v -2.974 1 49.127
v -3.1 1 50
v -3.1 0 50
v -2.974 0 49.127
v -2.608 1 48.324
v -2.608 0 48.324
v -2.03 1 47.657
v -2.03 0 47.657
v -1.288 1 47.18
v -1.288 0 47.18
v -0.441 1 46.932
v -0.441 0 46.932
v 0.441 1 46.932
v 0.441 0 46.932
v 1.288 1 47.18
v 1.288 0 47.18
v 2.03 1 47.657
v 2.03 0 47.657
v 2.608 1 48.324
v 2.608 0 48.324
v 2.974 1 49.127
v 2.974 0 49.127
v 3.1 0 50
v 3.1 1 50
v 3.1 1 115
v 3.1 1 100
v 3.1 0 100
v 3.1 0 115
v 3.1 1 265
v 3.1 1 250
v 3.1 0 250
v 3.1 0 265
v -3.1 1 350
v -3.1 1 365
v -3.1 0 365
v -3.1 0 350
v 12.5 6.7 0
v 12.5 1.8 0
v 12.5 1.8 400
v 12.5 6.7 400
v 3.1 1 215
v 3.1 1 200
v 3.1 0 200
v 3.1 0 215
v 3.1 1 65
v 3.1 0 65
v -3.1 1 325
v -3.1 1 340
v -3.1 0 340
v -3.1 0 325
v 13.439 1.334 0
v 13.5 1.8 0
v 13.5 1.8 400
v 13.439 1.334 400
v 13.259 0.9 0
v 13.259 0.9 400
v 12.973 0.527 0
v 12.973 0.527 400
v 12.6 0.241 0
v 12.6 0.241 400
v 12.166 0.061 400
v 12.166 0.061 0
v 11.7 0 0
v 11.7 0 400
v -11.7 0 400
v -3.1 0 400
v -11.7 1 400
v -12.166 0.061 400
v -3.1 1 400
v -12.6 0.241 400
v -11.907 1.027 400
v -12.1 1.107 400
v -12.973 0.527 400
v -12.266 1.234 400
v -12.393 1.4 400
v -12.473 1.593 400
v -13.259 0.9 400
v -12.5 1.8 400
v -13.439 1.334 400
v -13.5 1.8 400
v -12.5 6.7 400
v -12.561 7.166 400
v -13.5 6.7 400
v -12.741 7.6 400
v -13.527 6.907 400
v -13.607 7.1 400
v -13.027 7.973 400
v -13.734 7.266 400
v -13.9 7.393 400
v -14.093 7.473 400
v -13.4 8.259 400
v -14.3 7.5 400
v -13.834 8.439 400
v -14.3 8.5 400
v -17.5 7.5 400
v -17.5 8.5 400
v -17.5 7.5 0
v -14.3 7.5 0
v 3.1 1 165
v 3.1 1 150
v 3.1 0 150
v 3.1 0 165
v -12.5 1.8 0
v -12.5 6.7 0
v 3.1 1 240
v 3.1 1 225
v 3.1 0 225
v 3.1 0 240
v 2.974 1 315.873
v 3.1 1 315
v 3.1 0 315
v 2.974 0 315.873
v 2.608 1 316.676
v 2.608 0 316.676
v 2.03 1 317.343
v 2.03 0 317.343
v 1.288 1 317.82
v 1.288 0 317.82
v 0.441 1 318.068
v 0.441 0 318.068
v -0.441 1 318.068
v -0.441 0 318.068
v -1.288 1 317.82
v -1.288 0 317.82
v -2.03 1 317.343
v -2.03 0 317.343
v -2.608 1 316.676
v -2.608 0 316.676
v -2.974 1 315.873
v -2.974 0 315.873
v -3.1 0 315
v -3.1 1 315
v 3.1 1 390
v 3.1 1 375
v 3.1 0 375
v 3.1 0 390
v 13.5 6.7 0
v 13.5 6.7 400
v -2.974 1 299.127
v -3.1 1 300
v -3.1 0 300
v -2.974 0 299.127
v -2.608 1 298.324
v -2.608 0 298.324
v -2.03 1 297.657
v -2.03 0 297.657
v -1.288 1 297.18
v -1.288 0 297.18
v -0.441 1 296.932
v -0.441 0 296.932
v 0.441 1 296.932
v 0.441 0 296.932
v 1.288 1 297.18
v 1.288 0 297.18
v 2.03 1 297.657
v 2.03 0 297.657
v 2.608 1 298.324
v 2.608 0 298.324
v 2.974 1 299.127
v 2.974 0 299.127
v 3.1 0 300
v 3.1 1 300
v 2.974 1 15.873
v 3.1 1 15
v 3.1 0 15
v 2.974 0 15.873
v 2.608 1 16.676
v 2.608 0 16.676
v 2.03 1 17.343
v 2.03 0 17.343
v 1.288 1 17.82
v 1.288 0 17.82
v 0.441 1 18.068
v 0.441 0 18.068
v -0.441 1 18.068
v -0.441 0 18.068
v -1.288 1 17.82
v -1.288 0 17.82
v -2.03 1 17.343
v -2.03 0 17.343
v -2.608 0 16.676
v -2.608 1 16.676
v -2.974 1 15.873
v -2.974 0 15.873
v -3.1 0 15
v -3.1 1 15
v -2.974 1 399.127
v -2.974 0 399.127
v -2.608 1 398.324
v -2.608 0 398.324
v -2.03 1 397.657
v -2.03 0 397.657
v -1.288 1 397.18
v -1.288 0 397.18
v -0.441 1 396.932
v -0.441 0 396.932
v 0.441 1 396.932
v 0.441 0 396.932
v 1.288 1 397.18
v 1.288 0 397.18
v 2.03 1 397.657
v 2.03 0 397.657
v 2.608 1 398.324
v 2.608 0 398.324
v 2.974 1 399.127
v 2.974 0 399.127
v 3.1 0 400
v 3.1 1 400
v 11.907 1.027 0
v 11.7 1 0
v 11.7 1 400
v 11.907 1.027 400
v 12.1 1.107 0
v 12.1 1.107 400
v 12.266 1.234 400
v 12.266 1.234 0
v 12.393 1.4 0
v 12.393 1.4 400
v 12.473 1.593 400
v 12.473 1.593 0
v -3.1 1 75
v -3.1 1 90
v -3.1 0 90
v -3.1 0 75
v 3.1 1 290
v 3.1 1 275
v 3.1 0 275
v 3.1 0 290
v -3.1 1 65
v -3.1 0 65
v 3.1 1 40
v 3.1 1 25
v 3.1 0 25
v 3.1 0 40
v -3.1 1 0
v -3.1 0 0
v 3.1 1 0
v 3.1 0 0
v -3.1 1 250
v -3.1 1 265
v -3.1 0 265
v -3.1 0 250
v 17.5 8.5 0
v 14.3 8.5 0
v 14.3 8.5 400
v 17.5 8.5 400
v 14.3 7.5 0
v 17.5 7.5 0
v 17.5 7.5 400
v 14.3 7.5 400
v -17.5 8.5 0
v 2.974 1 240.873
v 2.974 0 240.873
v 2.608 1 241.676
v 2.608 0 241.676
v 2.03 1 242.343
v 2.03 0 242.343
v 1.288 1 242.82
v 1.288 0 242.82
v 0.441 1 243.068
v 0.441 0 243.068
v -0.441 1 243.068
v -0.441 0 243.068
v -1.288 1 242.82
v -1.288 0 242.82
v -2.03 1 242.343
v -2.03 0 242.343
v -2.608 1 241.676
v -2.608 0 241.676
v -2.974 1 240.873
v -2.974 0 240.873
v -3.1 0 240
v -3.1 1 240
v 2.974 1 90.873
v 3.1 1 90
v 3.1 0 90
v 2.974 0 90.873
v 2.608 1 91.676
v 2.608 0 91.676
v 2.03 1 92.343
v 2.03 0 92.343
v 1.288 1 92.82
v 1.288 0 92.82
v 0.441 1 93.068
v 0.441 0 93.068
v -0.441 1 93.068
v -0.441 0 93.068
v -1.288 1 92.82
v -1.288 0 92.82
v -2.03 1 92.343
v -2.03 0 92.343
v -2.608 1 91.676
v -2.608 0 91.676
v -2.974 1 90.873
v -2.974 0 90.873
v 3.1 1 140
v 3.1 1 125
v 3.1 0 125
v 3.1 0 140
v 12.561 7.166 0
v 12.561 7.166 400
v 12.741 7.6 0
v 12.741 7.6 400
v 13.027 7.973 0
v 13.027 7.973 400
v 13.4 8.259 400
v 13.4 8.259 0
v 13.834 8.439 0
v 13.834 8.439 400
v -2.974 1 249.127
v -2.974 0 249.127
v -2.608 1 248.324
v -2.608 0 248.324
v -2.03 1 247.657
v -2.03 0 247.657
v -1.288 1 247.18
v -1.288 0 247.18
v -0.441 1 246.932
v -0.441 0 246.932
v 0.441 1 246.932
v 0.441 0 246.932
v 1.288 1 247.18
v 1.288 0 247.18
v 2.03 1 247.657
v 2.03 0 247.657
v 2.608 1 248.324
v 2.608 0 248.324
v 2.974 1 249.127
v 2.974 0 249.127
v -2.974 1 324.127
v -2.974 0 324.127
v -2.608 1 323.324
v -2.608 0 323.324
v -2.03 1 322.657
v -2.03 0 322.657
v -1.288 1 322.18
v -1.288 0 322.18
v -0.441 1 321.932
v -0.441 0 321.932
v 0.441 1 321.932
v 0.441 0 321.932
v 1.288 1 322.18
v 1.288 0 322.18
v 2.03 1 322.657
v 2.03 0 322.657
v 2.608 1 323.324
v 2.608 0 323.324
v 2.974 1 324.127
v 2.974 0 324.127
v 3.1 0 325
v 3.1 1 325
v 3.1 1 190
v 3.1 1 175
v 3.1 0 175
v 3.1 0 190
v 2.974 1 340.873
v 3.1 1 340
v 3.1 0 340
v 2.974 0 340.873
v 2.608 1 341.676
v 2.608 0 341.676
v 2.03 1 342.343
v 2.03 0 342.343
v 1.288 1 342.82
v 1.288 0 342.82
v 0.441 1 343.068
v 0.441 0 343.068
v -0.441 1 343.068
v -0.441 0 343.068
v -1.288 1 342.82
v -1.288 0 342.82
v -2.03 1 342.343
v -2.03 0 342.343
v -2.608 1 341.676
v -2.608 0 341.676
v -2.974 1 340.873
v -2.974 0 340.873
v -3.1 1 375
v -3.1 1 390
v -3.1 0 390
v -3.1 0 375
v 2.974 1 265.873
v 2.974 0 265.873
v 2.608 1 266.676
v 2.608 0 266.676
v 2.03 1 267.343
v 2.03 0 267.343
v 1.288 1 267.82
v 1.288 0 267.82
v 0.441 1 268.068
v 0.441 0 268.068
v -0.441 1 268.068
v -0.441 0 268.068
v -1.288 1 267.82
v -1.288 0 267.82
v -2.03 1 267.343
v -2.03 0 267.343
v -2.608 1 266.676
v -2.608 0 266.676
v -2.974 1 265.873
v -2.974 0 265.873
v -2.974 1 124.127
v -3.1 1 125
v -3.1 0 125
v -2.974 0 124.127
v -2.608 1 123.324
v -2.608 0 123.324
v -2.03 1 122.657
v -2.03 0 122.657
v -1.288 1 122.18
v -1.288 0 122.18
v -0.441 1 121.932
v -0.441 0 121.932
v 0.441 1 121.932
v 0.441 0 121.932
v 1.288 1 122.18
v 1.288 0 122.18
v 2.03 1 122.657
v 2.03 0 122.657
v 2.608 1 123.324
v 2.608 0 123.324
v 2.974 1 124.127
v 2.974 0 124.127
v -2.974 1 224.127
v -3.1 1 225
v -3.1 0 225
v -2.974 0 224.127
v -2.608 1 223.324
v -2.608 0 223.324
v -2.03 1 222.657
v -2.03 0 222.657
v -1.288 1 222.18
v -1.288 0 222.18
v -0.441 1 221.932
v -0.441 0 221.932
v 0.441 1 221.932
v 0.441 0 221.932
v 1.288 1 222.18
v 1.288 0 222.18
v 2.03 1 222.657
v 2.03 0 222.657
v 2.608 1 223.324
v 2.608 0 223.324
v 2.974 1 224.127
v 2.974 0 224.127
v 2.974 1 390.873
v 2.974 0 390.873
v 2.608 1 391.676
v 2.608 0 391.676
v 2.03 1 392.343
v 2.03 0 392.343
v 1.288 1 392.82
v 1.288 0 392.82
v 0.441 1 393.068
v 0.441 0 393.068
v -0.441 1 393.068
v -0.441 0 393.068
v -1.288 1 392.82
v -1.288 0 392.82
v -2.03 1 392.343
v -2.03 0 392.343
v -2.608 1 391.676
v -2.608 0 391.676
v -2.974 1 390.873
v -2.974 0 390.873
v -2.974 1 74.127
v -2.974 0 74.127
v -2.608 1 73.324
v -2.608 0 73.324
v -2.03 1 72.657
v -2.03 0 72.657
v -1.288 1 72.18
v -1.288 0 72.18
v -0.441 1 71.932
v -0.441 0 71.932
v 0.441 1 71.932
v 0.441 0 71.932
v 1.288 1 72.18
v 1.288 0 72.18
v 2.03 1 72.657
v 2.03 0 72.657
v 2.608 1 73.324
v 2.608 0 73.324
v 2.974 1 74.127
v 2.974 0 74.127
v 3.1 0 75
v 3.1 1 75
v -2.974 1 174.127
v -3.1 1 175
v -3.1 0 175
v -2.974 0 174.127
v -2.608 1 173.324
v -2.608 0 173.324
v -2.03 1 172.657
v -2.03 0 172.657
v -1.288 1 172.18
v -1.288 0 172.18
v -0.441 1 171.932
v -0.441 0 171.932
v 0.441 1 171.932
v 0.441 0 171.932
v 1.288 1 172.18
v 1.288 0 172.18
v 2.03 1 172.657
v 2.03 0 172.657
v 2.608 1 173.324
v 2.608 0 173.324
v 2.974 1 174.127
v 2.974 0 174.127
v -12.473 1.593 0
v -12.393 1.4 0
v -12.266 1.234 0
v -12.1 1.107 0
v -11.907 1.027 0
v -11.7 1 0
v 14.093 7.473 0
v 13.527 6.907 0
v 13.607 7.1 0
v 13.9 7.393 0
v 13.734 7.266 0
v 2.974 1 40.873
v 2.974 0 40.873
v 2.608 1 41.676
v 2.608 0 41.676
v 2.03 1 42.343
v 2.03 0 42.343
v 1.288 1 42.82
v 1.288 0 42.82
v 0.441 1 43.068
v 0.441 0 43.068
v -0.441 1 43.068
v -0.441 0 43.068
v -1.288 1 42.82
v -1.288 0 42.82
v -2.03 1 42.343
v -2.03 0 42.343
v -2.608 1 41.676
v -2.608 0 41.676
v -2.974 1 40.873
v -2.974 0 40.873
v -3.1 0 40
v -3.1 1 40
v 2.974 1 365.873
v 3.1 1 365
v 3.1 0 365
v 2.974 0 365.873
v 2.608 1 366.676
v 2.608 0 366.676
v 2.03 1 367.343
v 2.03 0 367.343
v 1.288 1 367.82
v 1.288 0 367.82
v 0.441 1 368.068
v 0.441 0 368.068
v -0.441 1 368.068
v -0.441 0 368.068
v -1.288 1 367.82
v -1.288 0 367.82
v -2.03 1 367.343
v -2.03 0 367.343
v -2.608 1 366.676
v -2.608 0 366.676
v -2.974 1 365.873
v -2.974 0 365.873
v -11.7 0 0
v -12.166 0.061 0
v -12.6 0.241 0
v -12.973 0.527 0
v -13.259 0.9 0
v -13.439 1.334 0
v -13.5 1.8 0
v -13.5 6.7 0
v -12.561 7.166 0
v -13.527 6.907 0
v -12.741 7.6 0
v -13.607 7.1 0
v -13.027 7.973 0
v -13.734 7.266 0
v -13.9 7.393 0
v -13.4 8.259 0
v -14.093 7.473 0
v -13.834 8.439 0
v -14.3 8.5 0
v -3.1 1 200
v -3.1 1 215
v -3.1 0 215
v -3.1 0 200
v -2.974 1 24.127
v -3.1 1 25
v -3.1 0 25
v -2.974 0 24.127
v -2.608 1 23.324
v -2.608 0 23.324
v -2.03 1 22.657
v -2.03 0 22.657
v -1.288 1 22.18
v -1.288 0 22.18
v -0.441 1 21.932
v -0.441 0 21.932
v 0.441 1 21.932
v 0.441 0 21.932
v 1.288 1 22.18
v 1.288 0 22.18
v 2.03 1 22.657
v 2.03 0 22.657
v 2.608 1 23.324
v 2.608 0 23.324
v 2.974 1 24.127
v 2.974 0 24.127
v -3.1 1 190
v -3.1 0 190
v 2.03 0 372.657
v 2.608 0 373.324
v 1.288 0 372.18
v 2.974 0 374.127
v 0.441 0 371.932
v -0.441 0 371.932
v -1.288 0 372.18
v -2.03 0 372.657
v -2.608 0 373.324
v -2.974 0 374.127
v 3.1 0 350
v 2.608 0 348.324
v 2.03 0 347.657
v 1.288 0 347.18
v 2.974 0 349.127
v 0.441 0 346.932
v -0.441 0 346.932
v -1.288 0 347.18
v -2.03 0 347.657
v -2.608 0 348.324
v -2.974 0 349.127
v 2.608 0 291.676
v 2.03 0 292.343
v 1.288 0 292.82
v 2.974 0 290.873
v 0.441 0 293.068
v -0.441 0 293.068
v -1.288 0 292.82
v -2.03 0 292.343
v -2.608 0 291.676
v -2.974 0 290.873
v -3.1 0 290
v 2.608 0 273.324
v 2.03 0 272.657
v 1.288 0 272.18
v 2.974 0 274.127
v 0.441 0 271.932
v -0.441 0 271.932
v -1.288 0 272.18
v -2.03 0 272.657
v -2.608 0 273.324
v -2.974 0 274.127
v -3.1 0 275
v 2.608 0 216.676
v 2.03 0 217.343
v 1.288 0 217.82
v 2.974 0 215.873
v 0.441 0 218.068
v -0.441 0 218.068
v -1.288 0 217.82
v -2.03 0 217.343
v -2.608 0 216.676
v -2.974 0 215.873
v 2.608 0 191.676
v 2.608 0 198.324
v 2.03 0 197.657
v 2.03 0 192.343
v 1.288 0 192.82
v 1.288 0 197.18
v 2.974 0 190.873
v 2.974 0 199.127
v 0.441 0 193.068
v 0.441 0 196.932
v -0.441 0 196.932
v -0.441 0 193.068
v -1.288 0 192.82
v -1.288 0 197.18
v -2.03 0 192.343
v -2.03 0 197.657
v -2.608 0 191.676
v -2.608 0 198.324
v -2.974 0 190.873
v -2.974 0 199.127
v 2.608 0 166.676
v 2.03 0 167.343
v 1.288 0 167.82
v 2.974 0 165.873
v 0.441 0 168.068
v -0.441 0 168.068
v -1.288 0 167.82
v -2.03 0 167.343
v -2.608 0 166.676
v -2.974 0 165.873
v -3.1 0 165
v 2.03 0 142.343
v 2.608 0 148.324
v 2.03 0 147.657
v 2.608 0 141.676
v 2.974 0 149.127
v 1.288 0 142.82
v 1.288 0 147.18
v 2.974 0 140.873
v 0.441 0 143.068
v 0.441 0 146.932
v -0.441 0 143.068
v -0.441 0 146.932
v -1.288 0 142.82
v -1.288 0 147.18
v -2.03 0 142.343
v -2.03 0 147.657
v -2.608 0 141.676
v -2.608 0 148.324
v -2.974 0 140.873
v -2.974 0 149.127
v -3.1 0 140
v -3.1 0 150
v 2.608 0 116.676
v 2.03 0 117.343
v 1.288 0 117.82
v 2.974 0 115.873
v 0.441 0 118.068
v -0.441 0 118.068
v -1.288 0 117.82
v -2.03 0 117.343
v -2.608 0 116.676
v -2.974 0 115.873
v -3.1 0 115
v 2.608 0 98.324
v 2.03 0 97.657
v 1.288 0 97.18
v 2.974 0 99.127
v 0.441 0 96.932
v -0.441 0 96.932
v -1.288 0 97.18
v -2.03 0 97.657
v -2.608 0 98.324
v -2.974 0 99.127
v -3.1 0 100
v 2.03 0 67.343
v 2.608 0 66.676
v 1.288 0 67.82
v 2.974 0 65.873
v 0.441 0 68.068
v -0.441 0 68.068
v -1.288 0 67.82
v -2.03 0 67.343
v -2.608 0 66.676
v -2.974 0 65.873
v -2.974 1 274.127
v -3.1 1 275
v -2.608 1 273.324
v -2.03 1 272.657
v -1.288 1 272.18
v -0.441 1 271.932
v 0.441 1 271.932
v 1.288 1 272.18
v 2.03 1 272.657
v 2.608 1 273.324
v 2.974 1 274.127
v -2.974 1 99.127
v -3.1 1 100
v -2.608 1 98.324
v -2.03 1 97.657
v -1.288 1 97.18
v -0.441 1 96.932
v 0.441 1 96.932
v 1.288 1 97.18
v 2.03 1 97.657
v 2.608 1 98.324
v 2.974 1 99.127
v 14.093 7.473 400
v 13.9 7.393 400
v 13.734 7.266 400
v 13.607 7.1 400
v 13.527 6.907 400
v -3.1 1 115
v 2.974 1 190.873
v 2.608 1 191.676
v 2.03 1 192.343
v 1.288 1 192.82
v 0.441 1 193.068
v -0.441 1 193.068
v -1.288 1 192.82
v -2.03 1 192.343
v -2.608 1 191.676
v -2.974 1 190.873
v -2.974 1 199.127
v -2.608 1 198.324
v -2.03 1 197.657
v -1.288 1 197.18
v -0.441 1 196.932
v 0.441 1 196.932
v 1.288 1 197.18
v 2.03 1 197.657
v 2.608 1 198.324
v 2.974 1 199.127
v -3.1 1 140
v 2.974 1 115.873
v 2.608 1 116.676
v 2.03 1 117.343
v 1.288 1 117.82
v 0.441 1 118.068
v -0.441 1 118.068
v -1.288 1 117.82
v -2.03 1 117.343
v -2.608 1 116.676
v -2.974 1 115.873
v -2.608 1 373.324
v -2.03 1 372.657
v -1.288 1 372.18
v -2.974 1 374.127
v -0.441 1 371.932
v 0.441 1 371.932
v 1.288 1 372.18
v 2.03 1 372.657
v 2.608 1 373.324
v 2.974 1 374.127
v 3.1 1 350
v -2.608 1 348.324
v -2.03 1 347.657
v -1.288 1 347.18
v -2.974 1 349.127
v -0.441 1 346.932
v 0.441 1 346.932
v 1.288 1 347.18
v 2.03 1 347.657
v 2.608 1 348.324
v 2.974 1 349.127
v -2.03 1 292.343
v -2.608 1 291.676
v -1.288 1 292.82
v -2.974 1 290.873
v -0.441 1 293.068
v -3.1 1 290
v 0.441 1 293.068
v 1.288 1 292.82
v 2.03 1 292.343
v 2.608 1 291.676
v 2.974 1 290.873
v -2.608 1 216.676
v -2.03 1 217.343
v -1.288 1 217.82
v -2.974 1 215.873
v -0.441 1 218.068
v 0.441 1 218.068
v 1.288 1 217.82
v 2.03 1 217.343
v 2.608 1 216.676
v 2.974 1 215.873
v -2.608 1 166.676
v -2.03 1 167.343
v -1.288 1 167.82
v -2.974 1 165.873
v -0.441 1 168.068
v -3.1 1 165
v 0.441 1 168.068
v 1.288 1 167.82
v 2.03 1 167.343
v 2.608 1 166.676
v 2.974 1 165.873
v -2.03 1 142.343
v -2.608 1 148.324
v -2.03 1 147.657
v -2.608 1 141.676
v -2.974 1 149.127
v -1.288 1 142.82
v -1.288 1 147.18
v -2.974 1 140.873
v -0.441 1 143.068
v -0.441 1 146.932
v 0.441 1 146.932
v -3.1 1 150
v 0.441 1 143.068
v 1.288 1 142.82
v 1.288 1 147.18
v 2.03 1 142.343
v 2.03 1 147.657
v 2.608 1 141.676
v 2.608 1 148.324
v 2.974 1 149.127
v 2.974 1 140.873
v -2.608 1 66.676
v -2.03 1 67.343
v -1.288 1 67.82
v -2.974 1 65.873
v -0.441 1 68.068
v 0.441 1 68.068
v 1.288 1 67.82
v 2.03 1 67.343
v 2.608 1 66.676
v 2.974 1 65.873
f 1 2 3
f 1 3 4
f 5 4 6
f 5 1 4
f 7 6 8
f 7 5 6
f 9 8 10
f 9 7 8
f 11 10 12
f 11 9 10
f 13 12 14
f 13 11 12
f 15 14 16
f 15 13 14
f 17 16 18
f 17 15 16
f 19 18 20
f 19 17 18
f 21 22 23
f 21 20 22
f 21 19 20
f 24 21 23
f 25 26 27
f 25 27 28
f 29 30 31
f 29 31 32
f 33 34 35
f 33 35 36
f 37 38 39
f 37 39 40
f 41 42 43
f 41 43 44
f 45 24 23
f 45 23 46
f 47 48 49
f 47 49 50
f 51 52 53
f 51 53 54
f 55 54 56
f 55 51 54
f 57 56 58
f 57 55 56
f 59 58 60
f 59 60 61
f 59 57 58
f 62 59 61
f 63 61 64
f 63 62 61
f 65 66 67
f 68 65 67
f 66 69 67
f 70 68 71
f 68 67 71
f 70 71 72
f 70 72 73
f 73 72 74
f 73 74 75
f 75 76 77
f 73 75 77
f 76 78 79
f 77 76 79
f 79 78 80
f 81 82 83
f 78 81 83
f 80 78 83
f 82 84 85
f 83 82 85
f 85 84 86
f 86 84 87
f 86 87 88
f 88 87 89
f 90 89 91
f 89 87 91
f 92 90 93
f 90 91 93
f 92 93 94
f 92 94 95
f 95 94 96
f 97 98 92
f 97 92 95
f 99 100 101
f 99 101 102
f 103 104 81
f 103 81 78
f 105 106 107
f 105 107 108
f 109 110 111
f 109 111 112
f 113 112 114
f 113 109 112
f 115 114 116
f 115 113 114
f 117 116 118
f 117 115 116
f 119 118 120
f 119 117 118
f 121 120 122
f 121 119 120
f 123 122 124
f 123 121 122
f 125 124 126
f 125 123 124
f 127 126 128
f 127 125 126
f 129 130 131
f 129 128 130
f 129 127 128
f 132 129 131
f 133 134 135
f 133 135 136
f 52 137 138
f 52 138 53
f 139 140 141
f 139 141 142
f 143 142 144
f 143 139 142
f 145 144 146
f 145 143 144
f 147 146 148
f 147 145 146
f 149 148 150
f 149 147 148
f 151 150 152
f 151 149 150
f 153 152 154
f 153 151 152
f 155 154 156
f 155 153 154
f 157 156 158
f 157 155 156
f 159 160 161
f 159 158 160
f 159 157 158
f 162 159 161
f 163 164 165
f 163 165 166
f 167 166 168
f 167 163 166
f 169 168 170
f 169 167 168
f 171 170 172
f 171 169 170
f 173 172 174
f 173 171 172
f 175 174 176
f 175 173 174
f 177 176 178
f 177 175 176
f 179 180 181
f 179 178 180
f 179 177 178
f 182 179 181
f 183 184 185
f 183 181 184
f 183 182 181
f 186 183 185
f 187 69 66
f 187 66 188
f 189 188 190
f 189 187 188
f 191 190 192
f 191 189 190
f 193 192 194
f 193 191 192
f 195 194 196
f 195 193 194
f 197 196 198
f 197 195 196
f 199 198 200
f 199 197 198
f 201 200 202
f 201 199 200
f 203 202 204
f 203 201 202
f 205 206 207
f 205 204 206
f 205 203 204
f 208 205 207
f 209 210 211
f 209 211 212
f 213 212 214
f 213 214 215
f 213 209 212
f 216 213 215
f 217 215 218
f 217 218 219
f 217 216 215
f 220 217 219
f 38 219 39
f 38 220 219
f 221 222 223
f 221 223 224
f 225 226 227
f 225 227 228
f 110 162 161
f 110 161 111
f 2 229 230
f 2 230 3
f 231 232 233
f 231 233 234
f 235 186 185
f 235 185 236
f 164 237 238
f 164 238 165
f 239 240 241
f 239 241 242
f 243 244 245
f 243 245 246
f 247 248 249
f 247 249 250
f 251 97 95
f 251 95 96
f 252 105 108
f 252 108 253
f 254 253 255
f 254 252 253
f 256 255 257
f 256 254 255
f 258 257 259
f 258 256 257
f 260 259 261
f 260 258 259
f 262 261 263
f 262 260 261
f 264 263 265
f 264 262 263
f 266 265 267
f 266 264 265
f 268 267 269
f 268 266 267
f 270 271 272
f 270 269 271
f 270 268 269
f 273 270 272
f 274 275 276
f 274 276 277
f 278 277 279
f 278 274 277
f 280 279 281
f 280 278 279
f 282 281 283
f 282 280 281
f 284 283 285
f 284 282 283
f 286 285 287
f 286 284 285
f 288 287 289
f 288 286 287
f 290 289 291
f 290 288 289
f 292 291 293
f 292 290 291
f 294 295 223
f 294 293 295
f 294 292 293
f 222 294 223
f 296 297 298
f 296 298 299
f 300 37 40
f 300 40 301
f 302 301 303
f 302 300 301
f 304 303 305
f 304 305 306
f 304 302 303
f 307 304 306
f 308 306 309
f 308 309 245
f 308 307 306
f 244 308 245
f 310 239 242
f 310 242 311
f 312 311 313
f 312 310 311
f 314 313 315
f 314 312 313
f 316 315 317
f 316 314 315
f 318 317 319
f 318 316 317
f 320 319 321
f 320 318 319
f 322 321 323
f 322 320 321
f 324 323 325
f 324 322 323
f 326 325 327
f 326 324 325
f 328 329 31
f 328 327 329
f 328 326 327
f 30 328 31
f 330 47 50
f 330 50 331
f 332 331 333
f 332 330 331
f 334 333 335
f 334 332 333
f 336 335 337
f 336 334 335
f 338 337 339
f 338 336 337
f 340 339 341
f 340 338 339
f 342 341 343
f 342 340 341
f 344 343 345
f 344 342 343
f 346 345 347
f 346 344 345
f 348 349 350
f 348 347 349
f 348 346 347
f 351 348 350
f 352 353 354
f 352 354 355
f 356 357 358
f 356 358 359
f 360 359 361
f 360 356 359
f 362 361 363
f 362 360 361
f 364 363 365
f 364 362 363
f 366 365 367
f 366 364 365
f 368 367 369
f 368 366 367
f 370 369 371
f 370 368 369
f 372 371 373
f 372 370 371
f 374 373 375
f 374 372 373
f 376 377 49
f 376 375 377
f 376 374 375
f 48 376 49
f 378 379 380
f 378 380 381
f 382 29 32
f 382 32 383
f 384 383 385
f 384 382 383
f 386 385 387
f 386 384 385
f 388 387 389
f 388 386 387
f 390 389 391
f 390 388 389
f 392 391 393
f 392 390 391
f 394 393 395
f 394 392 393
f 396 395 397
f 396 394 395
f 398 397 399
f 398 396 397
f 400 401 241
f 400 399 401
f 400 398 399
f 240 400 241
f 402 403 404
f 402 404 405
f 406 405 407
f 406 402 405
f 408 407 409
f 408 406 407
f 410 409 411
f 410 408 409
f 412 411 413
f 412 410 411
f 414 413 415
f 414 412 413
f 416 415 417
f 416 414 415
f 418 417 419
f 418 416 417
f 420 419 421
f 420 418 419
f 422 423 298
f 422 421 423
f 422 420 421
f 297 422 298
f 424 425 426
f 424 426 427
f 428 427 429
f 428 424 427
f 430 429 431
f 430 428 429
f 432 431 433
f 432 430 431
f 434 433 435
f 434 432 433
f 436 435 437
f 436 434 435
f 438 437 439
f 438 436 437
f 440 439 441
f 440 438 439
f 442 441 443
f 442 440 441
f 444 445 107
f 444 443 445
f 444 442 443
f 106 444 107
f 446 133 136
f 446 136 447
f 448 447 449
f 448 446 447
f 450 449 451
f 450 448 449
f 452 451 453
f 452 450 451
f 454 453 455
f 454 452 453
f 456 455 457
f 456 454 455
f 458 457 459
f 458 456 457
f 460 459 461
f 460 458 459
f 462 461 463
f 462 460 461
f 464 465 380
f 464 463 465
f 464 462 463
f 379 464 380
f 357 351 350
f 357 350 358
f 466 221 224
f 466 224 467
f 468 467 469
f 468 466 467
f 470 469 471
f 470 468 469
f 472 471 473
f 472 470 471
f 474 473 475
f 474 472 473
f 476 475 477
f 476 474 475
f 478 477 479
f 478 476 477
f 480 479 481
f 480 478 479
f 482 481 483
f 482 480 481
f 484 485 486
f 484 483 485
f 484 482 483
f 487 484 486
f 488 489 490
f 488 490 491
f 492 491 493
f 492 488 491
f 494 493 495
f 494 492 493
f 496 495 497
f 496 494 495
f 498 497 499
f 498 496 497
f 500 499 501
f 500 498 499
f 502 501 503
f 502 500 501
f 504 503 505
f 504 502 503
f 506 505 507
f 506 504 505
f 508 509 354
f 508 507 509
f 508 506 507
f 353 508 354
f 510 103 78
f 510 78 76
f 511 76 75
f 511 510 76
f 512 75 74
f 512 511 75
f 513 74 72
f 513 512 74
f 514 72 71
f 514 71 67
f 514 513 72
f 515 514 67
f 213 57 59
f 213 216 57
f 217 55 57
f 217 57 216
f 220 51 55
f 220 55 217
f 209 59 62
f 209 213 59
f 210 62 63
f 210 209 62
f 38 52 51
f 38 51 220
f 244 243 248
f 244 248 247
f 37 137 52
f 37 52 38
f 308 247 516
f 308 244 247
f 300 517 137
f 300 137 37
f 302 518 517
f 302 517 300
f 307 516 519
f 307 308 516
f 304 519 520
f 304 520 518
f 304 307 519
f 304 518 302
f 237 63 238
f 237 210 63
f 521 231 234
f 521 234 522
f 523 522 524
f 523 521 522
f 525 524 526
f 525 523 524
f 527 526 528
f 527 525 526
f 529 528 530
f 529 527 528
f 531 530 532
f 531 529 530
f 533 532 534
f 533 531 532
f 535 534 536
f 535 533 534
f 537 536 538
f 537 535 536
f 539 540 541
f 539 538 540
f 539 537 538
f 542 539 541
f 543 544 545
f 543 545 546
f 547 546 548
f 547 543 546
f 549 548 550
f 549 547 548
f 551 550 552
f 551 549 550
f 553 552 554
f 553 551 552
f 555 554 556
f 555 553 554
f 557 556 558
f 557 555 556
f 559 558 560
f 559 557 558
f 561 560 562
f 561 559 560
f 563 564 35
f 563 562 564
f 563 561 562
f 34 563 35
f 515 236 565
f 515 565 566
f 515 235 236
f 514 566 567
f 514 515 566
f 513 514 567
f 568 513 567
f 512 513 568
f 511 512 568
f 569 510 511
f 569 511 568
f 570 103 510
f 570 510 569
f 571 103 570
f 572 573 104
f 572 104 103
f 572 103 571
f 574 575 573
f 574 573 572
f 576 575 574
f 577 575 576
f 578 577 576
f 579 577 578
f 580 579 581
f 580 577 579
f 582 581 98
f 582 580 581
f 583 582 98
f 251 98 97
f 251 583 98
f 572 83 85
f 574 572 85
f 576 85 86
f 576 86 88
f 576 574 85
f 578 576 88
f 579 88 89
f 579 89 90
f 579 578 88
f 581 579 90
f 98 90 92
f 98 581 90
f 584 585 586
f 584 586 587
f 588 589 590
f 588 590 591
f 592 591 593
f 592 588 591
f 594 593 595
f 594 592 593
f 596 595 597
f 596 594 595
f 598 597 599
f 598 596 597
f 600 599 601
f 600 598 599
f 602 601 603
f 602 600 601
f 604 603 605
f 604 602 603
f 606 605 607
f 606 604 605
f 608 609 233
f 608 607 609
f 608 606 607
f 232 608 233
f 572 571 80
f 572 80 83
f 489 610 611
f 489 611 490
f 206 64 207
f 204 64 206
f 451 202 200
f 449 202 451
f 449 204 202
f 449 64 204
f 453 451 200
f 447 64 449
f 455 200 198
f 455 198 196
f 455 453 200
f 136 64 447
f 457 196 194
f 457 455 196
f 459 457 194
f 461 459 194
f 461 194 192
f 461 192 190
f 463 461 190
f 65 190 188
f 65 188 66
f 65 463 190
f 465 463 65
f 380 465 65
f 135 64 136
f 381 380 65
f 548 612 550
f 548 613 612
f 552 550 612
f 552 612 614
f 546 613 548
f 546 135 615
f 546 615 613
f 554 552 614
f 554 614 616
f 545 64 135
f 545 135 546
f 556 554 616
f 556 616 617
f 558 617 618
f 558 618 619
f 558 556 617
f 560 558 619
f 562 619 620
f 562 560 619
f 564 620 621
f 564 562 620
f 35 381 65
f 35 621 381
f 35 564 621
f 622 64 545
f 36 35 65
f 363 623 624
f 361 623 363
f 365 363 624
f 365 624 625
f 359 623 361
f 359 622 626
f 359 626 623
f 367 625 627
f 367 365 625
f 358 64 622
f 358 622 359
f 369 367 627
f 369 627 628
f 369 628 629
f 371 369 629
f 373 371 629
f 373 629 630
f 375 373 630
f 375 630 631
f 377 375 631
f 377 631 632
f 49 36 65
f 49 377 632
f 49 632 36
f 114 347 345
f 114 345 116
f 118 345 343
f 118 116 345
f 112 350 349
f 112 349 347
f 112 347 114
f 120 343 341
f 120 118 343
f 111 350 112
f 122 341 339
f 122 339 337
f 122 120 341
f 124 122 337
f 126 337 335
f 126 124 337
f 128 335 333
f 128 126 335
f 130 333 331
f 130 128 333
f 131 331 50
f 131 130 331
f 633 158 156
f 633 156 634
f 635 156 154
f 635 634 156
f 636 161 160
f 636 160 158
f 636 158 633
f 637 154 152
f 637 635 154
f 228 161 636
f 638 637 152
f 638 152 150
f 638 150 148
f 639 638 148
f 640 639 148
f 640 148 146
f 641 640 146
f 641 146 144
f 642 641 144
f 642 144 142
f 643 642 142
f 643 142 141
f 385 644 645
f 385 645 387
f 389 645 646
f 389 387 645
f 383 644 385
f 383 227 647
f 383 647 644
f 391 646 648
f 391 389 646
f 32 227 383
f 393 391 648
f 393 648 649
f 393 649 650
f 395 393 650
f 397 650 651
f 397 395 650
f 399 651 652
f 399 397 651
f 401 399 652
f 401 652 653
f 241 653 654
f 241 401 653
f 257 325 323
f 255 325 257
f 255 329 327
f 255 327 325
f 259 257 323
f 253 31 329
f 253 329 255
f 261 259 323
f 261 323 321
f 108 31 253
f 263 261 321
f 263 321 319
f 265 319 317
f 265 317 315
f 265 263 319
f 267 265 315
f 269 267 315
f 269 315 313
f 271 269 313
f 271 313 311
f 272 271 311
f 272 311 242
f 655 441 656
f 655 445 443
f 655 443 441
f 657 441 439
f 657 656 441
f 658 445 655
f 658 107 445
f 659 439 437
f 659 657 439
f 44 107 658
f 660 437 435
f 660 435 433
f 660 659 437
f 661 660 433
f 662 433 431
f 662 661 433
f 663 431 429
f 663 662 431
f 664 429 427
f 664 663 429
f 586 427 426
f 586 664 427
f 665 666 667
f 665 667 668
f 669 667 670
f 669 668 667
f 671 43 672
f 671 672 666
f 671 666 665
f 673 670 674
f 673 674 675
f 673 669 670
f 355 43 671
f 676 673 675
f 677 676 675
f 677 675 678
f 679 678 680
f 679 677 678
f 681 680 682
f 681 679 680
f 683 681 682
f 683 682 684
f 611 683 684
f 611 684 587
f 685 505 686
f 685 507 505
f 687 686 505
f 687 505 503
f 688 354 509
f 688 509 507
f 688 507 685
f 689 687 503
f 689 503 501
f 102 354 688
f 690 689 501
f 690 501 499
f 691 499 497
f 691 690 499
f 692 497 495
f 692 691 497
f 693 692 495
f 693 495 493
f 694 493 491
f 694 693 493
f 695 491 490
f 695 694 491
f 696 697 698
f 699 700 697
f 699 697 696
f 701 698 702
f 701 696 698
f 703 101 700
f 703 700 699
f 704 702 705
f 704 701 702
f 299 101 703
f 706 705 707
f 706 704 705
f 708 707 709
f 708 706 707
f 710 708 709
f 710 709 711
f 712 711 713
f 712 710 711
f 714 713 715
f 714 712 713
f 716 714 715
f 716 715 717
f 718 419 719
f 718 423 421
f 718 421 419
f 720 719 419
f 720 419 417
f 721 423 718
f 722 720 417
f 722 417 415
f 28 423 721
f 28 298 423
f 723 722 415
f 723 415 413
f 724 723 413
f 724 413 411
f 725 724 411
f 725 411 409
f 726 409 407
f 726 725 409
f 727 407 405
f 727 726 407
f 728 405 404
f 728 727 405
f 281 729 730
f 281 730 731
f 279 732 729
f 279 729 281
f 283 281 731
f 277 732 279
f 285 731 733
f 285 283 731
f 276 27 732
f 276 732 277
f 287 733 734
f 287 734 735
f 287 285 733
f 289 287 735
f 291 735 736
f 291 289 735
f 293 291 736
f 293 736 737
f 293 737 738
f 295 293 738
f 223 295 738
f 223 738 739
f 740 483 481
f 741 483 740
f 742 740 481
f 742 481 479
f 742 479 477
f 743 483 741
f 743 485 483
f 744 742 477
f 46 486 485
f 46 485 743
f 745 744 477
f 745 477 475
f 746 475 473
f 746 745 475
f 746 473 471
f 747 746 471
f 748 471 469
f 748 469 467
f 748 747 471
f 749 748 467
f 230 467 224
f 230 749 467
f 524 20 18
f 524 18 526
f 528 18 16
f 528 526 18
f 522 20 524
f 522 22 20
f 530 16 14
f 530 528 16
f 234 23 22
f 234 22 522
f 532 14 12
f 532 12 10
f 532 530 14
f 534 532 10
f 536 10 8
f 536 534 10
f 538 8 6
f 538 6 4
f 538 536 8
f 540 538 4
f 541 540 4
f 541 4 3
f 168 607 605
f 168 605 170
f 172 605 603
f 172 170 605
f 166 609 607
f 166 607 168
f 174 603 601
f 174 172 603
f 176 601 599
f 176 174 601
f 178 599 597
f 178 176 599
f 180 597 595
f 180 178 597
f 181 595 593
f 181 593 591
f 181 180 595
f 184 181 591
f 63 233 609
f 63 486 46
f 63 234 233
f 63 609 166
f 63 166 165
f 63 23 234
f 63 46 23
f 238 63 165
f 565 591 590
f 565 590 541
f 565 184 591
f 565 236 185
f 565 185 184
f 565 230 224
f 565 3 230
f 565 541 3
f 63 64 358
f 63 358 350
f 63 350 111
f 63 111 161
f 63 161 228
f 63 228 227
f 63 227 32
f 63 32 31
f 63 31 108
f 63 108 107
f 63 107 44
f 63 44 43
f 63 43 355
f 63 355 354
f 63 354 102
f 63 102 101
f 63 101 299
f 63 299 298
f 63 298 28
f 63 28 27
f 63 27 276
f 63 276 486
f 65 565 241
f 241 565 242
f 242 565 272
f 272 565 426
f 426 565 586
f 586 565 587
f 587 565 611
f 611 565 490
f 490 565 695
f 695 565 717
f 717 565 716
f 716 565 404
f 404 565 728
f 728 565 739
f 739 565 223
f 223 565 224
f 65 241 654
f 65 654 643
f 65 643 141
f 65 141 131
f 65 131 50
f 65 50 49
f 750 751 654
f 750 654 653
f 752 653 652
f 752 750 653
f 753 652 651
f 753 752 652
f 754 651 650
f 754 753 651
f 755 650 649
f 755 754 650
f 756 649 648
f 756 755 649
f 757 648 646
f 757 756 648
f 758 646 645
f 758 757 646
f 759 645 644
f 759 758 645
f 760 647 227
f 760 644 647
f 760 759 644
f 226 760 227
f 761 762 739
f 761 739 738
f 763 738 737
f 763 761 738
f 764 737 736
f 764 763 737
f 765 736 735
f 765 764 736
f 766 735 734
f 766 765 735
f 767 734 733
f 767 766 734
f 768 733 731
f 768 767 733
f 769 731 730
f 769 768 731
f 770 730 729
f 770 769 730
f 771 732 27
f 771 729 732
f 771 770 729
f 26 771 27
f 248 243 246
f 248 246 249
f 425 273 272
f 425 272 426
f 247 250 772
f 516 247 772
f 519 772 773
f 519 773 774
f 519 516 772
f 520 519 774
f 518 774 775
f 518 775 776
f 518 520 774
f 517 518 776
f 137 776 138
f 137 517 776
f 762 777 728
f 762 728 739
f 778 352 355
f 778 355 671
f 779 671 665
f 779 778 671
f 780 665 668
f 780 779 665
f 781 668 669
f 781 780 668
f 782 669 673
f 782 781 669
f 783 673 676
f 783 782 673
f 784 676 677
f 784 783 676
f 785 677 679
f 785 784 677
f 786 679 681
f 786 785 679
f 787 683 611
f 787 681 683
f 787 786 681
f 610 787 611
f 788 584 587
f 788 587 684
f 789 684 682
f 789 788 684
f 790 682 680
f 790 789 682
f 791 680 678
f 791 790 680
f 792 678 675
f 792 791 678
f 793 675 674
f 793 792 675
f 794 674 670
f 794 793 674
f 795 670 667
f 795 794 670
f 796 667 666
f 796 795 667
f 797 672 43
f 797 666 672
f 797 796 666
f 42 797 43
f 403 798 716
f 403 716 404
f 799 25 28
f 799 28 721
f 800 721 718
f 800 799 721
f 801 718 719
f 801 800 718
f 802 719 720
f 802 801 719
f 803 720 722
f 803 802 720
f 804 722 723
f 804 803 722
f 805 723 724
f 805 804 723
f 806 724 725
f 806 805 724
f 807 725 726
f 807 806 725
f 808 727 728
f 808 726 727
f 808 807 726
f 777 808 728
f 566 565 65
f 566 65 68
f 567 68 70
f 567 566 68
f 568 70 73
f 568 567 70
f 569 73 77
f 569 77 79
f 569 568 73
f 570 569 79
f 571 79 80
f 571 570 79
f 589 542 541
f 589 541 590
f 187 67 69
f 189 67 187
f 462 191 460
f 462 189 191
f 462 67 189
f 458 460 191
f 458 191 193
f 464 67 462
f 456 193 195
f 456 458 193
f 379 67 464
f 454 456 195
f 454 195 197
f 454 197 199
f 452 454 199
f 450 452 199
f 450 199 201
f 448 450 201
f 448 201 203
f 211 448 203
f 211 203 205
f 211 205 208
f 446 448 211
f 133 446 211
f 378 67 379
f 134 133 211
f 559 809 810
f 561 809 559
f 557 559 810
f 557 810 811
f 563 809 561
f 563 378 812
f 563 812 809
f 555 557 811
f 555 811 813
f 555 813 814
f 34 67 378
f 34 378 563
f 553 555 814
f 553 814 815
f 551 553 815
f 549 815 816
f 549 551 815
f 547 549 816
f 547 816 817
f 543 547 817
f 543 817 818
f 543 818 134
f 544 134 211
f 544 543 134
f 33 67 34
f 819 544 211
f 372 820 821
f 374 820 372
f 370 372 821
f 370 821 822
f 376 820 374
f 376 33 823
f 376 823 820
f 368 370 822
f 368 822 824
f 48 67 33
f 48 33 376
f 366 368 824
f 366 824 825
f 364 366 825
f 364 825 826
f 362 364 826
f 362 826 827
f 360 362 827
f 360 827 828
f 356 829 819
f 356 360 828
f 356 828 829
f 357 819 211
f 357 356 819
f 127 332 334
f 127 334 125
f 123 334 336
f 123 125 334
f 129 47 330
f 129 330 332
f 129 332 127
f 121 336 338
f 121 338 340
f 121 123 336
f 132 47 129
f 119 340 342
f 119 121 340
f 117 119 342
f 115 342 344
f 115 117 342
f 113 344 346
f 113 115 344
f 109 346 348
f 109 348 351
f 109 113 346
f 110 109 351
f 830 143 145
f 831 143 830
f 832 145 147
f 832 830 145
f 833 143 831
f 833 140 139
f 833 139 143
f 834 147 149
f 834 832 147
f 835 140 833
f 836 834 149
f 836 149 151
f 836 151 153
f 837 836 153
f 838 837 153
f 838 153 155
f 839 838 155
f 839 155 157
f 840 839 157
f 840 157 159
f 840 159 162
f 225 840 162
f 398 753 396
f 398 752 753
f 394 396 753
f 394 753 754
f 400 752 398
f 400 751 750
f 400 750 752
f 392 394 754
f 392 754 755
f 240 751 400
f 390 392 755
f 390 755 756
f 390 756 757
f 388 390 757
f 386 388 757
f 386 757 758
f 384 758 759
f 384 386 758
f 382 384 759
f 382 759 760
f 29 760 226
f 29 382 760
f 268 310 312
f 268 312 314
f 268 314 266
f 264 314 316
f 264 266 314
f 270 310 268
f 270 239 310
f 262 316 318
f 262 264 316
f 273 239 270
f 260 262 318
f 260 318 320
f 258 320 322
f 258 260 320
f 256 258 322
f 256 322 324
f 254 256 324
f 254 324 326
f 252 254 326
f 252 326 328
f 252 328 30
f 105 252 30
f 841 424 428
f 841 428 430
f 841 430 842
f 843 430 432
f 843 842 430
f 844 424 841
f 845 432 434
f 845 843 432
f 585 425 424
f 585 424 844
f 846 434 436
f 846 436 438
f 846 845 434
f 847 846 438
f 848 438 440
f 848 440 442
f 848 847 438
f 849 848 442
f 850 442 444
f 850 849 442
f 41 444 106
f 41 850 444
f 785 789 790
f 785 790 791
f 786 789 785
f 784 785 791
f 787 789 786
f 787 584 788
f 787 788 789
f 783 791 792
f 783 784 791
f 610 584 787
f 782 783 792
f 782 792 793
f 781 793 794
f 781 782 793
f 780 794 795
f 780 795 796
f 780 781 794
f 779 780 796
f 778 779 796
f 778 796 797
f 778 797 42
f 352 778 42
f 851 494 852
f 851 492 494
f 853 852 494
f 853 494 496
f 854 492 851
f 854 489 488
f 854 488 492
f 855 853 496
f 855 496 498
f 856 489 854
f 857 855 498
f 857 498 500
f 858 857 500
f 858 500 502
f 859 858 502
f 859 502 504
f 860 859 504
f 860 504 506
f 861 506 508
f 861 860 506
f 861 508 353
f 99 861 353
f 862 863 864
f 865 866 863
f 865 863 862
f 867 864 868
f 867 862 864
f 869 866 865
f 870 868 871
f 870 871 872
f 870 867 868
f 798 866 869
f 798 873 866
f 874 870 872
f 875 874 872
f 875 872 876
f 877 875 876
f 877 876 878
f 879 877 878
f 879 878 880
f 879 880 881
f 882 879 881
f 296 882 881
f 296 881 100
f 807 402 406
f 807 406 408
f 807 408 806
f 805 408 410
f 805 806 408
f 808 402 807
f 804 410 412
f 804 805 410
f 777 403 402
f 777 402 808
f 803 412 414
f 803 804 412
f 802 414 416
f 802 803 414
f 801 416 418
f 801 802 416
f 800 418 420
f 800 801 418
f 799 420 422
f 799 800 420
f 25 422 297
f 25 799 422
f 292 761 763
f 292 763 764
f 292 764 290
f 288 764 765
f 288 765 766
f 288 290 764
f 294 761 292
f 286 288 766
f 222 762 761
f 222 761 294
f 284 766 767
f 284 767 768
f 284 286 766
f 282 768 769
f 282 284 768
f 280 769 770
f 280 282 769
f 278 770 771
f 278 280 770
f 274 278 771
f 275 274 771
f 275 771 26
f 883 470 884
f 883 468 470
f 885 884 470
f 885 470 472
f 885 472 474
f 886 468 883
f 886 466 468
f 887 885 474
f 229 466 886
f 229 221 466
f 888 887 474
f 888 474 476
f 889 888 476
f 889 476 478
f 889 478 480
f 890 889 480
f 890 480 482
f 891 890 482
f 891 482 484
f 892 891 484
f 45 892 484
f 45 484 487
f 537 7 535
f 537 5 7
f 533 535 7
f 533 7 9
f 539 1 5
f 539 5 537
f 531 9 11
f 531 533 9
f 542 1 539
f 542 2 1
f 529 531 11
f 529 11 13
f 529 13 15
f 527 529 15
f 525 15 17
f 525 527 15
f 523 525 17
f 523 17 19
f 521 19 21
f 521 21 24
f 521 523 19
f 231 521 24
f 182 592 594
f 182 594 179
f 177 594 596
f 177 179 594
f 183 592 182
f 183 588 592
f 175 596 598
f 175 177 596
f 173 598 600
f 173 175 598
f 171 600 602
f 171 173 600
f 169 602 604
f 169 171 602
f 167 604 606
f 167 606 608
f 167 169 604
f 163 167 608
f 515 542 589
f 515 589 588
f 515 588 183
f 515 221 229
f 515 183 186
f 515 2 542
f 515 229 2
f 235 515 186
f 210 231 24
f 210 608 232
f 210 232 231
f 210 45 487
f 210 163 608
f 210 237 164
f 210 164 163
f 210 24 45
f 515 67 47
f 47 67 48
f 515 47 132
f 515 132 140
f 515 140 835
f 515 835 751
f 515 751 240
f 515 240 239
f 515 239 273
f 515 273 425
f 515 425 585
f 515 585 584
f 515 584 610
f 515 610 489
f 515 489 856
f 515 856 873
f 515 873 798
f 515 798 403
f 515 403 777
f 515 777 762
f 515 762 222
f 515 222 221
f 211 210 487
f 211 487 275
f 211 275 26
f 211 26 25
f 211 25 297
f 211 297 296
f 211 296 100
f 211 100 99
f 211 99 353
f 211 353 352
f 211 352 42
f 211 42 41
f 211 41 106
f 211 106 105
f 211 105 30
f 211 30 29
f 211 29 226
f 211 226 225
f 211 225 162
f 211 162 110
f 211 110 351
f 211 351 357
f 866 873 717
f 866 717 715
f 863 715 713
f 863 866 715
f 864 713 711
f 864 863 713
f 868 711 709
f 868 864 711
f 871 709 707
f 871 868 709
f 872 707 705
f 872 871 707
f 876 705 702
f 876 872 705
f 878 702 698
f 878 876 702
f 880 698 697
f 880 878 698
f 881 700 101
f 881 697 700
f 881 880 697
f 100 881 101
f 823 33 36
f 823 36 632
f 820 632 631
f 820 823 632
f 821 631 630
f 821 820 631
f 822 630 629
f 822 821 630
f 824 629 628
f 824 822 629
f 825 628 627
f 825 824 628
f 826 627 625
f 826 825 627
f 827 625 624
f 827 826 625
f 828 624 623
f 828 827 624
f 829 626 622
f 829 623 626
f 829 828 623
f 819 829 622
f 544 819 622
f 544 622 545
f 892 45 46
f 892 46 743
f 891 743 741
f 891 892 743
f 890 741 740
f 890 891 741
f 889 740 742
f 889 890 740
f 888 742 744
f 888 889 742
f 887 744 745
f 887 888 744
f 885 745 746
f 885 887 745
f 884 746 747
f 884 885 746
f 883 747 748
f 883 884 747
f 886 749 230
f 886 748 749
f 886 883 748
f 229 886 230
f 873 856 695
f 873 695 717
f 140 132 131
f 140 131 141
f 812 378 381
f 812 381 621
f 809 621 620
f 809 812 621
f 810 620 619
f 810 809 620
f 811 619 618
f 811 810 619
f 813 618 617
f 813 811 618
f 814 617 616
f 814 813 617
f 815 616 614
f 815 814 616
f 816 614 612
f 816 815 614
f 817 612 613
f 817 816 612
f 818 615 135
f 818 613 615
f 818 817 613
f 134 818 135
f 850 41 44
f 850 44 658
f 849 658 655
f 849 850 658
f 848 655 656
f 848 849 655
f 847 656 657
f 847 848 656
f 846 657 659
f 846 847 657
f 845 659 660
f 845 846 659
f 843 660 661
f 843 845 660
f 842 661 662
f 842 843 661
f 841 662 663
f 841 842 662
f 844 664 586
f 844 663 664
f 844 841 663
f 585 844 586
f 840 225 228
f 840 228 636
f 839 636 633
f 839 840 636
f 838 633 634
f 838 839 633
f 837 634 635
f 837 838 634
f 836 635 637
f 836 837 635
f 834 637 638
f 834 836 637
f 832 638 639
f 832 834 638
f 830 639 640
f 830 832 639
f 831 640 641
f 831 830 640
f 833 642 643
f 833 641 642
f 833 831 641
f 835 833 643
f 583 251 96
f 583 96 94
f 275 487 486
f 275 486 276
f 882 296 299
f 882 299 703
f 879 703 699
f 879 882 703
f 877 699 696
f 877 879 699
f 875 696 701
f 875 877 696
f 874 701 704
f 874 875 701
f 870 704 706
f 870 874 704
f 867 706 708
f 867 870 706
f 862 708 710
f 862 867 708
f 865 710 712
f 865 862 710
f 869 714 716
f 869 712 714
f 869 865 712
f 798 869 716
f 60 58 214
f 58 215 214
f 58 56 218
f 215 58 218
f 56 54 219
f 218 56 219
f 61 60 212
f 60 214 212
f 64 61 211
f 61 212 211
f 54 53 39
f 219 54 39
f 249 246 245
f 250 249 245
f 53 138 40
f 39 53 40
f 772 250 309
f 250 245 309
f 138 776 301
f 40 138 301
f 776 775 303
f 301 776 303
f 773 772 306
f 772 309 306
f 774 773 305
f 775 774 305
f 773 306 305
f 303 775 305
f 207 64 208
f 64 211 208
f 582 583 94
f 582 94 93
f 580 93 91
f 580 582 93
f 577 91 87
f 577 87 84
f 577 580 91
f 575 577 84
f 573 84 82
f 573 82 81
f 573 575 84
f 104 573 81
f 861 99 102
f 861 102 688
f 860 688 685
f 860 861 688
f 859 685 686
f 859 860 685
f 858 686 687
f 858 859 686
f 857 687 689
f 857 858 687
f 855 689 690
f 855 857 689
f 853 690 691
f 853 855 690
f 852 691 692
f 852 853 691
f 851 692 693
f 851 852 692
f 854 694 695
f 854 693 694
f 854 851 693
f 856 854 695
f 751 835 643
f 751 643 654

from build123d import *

# Parameters (mm, degrees)
BOSS_EXTRUDE2_DEPTH = 400
CUT_EXTRUDE1_DEPTH  = 100


with BuildPart() as part:
    # Sketch1 → Boss-Extrude2 (new body)
    with BuildSketch(Plane.XY):
        with BuildLine():
            Line((0, 0), (-11.7, 0))
            ThreePointArc((-11.7, 0), (-12.972792206, 0.527207794), (-13.5, 1.8))
            Line((-13.5, 1.8), (-13.5, 6.7))
            ThreePointArc((-13.5, 6.7), (-13.734314575, 7.265685425), (-14.3, 7.5))
            Line((-14.3, 7.5), (-17.5, 7.5))
            Line((-17.5, 7.5), (-17.5, 8.5))
            Line((-17.5, 8.5), (-14.3, 8.5))
            ThreePointArc((-14.3, 8.5), (-13.027207794, 7.972792206), (-12.5, 6.7))
            Line((-12.5, 6.7), (-12.5, 1.8))
            ThreePointArc((-12.5, 1.8), (-12.265685425, 1.234314575), (-11.7, 1))
            Line((-11.7, 1), (0, 1))
            Line((0, 1), (11.7, 1))
            ThreePointArc((11.7, 1), (12.265685425, 1.234314575), (12.5, 1.8))
            Line((12.5, 1.8), (12.5, 6.7))
            ThreePointArc((12.5, 6.7), (13.027207794, 7.972792206), (14.3, 8.5))
            Line((14.3, 8.5), (17.5, 8.5))
            Line((17.5, 8.5), (17.5, 7.5))
            Line((17.5, 7.5), (14.3, 7.5))
            ThreePointArc((14.3, 7.5), (13.734314575, 7.265685425), (13.5, 6.7))
            Line((13.5, 6.7), (13.5, 1.8))
            ThreePointArc((13.5, 1.8), (12.972792206, 0.527207794), (11.7, 0))
            Line((11.7, 0), (0, 0))
        make_face()
    extrude(amount=BOSS_EXTRUDE2_DEPTH)

    # Sketch2 → Cut-Extrude1 (cut)
    with BuildSketch(Plane(origin=(0, 1, 0), x_dir=(1, 0, 0), z_dir=(0, 1, 0))):
        with BuildLine():
            Line((-3.1, -390), (-3.1, -375))
            ThreePointArc((-3.1, -375), (0, -371.9), (3.1, -375))
            Line((3.1, -375), (3.1, -390))
            ThreePointArc((3.1, -390), (0, -393.1), (-3.1, -390))
        make_face()
        with BuildLine():
            Line((-3.1, -365), (-3.1, -350))
            ThreePointArc((-3.1, -350), (0, -346.9), (3.1, -350))
            Line((3.1, -350), (3.1, -365))
            ThreePointArc((3.1, -365), (0, -368.1), (-3.1, -365))
        make_face()
        with BuildLine():
            Line((-3.1, -340), (-3.1, -325))
            ThreePointArc((-3.1, -325), (0, -321.9), (3.1, -325))
            Line((3.1, -325), (3.1, -340))
            ThreePointArc((3.1, -340), (0, -343.1), (-3.1, -340))
        make_face()
        with BuildLine():
            Line((-3.1, -315), (-3.1, -300))
            ThreePointArc((-3.1, -300), (0, -296.9), (3.1, -300))
            Line((3.1, -300), (3.1, -315))
            ThreePointArc((3.1, -315), (0, -318.1), (-3.1, -315))
        make_face()
        with BuildLine():
            Line((-3.1, -415), (-3.1, -400))
            ThreePointArc((-3.1, -400), (0, -396.9), (3.1, -400))
            Line((3.1, -400), (3.1, -415))
            ThreePointArc((3.1, -415), (0, -418.1), (-3.1, -415))
        make_face()
        with BuildLine():
            Line((-3.1, -290), (-3.1, -275))
            ThreePointArc((-3.1, -275), (0, -271.9), (3.1, -275))
            Line((3.1, -275), (3.1, -290))
            ThreePointArc((3.1, -290), (0, -293.1), (-3.1, -290))
        make_face()
        with BuildLine():
            Line((-3.1, -265), (-3.1, -250))
            ThreePointArc((-3.1, -250), (0, -246.9), (3.1, -250))
            Line((3.1, -250), (3.1, -265))
            ThreePointArc((3.1, -265), (0, -268.1), (-3.1, -265))
        make_face()
        with BuildLine():
            Line((-3.1, -240), (-3.1, -225))
            ThreePointArc((-3.1, -225), (0, -221.9), (3.1, -225))
            Line((3.1, -225), (3.1, -240))
            ThreePointArc((3.1, -240), (0, -243.1), (-3.1, -240))
        make_face()
        with BuildLine():
            Line((-3.1, -215), (-3.1, -200))
            ThreePointArc((-3.1, -200), (0, -196.9), (3.1, -200))
            Line((3.1, -200), (3.1, -215))
            ThreePointArc((3.1, -215), (0, -218.1), (-3.1, -215))
        make_face()
        with BuildLine():
            Line((-3.1, -190), (-3.1, -175))
            ThreePointArc((-3.1, -175), (0, -171.9), (3.1, -175))
            Line((3.1, -175), (3.1, -190))
            ThreePointArc((3.1, -190), (0, -193.1), (-3.1, -190))
        make_face()
        with BuildLine():
            Line((-3.1, -165), (-3.1, -150))
            ThreePointArc((-3.1, -150), (0, -146.9), (3.1, -150))
            Line((3.1, -150), (3.1, -165))
            ThreePointArc((3.1, -165), (0, -168.1), (-3.1, -165))
        make_face()
        with BuildLine():
            Line((-3.1, -140), (-3.1, -125))
            ThreePointArc((-3.1, -125), (0, -121.9), (3.1, -125))
            Line((3.1, -125), (3.1, -140))
            ThreePointArc((3.1, -140), (0, -143.1), (-3.1, -140))
        make_face()
        with BuildLine():
            Line((-3.1, -115), (-3.1, -100))
            ThreePointArc((-3.1, -100), (0, -96.9), (3.1, -100))
            Line((3.1, -100), (3.1, -115))
            ThreePointArc((3.1, -115), (0, -118.1), (-3.1, -115))
        make_face()
        with BuildLine():
            Line((-3.1, -90), (-3.1, -75))
            ThreePointArc((-3.1, -75), (0, -71.9), (3.1, -75))
            Line((3.1, -75), (3.1, -90))
            ThreePointArc((3.1, -90), (0, -93.1), (-3.1, -90))
        make_face()
        with BuildLine():
            Line((-3.1, -65), (-3.1, -50))
            ThreePointArc((-3.1, -50), (0, -46.9), (3.1, -50))
            Line((3.1, -50), (3.1, -65))
            ThreePointArc((3.1, -65), (0, -68.1), (-3.1, -65))
        make_face()
        with BuildLine():
            Line((-3.1, -40), (-3.1, -25))
            ThreePointArc((-3.1, -25), (0, -21.9), (3.1, -25))
            Line((3.1, -25), (3.1, -40))
            ThreePointArc((3.1, -40), (0, -43.1), (-3.1, -40))
        make_face()
        with BuildLine():
            Line((-3.1, -15), (-3.1, 0))
            ThreePointArc((-3.1, 0), (0, 3.1), (3.1, 0))
            Line((3.1, 0), (3.1, -15))
            ThreePointArc((3.1, -15), (0, -18.1), (-3.1, -15))
        make_face()
    extrude(amount=-CUT_EXTRUDE1_DEPTH, mode=Mode.SUBTRACT)


solid = part.part
